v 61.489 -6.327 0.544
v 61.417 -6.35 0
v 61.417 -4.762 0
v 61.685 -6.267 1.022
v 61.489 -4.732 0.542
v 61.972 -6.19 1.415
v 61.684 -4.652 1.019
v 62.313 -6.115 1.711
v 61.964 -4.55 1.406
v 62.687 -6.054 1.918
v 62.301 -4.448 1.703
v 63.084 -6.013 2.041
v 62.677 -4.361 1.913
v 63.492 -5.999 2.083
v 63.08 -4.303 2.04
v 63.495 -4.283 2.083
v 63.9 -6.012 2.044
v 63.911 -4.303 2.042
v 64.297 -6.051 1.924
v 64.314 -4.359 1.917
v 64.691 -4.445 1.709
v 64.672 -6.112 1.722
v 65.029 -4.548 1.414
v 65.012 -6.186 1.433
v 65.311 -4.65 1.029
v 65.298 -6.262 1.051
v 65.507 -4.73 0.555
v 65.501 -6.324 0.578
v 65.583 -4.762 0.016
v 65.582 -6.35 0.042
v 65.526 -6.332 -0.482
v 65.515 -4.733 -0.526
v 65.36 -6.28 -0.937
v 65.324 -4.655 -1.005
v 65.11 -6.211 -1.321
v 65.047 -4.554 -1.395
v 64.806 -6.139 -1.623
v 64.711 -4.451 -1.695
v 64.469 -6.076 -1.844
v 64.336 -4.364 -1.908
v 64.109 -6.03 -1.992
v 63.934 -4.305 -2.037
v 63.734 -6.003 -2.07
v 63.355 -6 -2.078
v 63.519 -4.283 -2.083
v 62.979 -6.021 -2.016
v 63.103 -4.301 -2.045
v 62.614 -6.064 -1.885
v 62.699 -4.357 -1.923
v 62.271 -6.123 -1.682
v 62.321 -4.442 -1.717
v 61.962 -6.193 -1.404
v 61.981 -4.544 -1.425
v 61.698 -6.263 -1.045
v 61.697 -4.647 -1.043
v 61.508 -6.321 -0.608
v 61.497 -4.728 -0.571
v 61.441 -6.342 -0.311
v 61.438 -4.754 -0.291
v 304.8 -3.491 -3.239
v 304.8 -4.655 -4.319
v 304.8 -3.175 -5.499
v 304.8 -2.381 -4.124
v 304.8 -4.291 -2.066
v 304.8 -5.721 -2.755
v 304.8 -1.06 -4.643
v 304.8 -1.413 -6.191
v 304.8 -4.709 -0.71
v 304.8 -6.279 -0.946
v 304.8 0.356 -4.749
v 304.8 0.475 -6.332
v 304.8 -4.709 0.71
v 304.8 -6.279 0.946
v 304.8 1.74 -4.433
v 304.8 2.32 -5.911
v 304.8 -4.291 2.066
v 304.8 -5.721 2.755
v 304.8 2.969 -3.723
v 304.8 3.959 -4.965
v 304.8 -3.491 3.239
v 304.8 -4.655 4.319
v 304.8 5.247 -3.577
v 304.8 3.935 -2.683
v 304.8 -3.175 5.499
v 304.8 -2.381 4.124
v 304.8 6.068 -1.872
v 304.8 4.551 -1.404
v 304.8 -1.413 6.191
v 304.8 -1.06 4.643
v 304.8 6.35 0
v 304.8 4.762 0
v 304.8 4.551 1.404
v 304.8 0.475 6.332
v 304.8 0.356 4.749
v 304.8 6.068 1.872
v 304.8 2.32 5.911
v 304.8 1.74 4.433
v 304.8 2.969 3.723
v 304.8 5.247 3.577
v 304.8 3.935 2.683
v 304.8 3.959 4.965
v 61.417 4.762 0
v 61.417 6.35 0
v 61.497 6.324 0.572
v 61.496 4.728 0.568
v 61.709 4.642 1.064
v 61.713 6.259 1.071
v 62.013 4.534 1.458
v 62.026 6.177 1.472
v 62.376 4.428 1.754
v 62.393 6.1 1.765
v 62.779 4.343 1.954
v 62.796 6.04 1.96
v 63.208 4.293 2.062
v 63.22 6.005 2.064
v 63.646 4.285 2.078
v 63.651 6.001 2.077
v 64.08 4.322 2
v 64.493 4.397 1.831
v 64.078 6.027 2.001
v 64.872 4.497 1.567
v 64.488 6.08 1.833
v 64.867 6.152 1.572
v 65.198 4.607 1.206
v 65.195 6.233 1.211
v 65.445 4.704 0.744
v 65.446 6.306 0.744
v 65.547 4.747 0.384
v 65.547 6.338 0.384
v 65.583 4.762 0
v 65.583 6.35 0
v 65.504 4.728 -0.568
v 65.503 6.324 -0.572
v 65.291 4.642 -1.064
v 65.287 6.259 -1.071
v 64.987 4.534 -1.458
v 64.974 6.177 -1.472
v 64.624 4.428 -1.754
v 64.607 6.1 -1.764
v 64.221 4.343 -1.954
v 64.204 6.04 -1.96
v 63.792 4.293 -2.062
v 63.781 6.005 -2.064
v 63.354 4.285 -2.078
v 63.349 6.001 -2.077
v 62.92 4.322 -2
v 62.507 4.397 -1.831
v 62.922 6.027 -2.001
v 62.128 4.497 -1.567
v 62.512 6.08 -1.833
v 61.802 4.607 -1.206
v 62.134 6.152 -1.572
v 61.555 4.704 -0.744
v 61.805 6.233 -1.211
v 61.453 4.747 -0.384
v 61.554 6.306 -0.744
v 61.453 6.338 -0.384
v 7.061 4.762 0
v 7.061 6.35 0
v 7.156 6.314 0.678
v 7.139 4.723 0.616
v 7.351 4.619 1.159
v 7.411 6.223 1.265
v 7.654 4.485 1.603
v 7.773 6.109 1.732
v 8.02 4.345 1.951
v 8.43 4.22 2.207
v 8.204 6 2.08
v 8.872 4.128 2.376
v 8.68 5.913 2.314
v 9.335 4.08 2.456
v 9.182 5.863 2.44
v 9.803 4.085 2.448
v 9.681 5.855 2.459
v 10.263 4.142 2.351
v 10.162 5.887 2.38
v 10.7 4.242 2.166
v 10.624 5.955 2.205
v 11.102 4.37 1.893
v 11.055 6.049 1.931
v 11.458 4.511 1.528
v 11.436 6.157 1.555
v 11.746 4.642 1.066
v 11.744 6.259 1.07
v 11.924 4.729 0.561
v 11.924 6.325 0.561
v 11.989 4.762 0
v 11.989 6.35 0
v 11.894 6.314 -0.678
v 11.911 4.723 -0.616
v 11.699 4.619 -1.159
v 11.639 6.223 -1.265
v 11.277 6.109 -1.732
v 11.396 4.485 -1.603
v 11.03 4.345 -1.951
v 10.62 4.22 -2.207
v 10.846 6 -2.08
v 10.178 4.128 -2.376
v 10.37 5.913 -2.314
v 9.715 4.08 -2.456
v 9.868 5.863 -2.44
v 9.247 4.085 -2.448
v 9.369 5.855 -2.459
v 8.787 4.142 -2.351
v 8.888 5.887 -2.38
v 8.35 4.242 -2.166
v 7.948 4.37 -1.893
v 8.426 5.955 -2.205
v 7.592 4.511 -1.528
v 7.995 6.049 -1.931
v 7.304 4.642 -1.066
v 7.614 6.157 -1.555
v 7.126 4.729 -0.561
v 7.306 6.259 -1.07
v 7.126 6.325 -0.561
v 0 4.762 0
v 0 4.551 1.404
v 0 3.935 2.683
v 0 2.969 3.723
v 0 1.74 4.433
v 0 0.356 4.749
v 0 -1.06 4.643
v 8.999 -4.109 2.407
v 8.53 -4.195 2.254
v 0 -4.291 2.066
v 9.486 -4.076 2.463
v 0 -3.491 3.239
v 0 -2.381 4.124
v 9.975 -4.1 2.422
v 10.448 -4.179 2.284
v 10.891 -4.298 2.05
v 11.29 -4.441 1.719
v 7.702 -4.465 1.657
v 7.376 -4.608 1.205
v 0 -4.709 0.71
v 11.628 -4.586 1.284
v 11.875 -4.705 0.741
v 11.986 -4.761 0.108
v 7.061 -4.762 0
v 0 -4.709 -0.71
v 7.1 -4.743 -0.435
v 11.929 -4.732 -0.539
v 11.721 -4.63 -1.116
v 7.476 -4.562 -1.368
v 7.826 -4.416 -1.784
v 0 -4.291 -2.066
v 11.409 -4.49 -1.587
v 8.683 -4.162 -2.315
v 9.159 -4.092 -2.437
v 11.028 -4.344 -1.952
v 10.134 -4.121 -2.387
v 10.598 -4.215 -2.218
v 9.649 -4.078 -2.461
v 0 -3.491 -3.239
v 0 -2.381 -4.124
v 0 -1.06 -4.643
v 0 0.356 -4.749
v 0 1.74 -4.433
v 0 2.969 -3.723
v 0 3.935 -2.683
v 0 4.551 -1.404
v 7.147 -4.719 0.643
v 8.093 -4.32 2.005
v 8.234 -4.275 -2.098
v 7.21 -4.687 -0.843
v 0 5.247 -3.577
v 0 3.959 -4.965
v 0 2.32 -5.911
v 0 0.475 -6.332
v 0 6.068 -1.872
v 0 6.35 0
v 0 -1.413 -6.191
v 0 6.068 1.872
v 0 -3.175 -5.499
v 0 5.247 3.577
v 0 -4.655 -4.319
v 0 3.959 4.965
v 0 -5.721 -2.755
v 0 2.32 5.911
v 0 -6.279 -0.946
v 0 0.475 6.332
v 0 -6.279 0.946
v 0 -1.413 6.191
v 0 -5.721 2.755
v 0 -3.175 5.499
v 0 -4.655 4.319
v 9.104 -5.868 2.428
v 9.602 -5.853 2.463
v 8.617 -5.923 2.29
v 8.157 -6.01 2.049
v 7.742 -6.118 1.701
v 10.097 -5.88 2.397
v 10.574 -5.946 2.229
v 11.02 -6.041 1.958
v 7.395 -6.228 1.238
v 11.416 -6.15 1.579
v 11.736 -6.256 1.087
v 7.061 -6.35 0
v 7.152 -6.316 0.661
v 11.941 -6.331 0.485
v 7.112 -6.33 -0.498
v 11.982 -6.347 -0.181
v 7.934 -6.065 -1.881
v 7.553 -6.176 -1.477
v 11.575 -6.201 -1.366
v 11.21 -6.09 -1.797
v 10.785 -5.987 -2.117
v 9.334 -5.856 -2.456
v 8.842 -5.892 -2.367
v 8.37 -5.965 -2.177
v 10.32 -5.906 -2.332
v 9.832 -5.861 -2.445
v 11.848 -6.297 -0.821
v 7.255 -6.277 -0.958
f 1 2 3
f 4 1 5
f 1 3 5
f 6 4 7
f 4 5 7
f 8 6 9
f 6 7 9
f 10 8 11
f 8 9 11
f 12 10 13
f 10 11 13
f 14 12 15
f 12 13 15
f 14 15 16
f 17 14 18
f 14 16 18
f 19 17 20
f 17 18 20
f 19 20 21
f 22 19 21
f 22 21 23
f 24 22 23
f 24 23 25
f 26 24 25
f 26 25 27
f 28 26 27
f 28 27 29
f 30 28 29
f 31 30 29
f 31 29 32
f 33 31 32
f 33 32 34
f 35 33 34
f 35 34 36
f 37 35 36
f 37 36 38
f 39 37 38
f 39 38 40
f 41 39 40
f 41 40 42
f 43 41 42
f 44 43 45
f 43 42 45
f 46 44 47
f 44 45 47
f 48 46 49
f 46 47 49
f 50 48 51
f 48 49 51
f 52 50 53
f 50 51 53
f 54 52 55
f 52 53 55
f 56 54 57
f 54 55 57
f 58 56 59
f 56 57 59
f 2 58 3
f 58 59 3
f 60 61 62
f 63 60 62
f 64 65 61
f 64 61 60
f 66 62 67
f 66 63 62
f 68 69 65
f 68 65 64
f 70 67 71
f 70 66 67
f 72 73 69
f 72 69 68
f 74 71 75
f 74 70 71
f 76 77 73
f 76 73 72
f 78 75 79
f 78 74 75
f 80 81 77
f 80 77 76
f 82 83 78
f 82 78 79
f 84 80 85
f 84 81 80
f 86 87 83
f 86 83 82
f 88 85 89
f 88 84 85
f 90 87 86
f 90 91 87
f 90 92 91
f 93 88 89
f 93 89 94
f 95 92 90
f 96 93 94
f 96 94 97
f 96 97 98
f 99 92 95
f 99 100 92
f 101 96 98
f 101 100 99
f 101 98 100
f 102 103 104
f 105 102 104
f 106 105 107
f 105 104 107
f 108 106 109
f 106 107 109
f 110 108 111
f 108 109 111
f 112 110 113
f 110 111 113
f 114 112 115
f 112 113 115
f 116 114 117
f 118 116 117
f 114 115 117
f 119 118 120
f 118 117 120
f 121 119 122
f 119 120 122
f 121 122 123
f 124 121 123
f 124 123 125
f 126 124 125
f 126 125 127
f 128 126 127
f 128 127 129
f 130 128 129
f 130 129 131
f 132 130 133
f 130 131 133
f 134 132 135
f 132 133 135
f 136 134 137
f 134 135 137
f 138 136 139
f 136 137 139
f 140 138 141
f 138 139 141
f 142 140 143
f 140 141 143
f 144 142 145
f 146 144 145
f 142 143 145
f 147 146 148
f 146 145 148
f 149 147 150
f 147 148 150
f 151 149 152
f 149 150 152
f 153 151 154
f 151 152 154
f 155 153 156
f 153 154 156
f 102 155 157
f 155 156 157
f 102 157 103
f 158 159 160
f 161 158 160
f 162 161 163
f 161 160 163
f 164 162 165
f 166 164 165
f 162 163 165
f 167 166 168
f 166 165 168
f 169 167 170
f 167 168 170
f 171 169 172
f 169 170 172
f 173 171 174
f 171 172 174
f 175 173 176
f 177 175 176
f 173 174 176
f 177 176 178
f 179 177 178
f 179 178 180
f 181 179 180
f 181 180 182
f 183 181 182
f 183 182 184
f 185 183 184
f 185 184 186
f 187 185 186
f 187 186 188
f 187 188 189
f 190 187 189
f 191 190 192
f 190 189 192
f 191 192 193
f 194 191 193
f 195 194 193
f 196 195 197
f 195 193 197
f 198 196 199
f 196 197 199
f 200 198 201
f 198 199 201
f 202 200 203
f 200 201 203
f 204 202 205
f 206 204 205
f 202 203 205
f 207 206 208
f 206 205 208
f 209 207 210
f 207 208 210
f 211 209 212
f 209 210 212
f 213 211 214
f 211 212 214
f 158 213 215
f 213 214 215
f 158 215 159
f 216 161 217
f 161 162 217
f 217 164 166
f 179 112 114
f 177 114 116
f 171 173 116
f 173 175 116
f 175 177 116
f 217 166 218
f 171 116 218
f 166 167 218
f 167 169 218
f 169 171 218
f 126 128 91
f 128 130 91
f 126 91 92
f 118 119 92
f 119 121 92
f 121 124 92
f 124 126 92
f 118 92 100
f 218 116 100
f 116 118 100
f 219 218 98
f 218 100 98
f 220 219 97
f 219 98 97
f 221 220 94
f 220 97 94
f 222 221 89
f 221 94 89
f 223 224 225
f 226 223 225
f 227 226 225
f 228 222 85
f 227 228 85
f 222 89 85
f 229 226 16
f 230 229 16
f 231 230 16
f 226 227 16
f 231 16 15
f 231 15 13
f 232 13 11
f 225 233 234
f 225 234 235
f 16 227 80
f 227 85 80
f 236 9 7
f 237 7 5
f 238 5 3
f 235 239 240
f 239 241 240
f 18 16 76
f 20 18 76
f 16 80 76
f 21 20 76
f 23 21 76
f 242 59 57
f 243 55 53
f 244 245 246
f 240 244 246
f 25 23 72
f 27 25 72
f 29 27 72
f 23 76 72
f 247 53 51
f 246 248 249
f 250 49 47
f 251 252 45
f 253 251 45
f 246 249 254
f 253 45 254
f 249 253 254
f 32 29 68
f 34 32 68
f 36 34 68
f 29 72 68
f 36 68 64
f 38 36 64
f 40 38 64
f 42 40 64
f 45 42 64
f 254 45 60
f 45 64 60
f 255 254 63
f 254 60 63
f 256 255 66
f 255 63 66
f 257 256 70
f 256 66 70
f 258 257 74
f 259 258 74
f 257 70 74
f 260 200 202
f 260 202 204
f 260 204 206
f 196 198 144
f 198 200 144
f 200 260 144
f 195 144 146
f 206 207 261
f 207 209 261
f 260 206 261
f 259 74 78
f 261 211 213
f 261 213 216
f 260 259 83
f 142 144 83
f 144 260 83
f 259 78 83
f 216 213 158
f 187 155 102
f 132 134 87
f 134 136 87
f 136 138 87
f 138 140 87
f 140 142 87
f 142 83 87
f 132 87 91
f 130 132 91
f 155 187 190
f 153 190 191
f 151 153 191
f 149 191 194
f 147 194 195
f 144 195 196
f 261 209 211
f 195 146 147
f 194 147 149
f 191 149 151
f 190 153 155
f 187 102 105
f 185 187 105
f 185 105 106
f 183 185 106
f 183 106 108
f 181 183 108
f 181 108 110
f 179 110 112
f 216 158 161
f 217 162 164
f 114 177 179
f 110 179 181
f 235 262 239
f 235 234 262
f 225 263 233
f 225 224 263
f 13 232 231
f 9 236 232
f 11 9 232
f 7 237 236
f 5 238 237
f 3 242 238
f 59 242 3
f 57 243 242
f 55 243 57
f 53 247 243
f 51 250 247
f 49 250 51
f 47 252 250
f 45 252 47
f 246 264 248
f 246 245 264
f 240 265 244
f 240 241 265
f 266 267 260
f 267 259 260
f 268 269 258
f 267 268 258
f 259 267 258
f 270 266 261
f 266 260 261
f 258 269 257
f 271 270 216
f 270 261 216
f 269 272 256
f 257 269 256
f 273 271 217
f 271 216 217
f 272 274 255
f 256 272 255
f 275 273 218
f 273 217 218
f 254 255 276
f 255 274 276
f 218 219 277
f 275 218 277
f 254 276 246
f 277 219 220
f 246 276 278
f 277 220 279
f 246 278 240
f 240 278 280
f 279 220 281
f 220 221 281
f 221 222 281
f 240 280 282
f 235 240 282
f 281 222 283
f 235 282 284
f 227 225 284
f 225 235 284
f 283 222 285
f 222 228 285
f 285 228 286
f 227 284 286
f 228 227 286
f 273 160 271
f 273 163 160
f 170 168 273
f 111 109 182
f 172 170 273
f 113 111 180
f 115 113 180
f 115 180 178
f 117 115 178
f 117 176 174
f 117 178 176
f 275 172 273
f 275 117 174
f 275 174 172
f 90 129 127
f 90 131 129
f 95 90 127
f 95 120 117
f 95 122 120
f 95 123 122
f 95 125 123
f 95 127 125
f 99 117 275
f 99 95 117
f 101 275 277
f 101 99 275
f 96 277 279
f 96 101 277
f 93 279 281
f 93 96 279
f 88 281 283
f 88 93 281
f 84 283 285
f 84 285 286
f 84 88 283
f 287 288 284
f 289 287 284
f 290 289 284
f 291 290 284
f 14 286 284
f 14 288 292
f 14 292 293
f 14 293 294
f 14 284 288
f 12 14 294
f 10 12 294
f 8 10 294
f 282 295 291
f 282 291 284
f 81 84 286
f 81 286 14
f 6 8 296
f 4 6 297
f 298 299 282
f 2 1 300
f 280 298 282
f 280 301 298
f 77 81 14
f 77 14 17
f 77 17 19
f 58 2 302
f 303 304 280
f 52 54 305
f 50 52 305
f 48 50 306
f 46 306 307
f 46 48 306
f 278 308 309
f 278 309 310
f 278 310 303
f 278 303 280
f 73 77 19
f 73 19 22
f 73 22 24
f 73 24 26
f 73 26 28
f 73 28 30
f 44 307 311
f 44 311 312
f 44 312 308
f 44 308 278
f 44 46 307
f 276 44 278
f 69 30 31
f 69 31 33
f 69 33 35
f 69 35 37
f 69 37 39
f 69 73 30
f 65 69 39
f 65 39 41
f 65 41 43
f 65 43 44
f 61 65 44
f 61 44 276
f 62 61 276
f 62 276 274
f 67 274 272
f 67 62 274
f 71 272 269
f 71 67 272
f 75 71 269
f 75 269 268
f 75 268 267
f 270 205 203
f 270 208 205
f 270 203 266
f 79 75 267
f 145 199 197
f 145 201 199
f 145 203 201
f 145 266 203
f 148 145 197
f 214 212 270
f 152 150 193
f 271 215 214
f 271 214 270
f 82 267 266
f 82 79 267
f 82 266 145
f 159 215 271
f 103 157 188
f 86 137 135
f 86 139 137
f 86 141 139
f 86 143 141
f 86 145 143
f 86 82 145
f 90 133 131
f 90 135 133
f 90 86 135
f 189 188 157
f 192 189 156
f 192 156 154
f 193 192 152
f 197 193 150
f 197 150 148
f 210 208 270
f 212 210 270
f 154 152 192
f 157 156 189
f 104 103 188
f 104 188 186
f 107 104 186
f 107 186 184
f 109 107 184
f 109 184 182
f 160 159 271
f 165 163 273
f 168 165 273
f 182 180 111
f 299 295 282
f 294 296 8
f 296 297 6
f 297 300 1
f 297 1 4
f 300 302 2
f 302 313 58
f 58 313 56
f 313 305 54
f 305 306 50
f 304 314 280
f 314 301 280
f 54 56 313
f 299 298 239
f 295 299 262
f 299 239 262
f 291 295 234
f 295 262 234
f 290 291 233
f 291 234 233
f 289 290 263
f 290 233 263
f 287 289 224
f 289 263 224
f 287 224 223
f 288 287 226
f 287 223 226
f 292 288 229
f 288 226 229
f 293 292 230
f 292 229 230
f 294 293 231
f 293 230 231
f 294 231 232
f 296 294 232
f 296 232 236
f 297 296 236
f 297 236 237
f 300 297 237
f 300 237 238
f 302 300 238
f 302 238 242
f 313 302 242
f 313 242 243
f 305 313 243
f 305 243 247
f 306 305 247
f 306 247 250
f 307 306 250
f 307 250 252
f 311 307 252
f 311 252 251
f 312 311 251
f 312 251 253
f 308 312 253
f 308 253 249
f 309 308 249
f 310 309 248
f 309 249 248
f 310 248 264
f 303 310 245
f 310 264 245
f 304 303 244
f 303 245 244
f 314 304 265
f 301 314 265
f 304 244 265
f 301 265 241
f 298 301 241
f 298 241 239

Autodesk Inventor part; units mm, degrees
ref_plane "YZ Plane" through (0, 0, 0) normal (1, 0, 0) x (0, 1, 0)
sketch "Sketch1" plane through (0, 0, 0) normal (0, 0, 1) x (1, 0, 0)
  line L0 (0, 0) -> (304.8, 0)
  arc A0 (304.8, 0) -> (406.4, 101.6) centre (304.8, 101.6) ccw
  line L1 (406.4, 101.6) -> (406.4, 152.4)
  line L2 (304.8, 0) -> (304.8, 101.6) construction
  line L3 (304.8, 101.6) -> (406.4, 101.6) construction
  arc A1 (406.4, 152.4) -> (304.8, 254) centre (304.8, 152.4) ccw
  line L4 (406.4, 152.4) -> (304.8, 152.4) construction
  line L5 (304.8, 152.4) -> (304.8, 254) construction
  line L6 (304.8, 254) -> (203.2, 254)
  circle A2 centre (668.9835, 281.347) radius 317.5 construction
  dimension "d0" = 304.8
  dimension "d1" = 101.6
  dimension "d2" = 50.8
  dimension "d3" = 101.6
  dimension "d4" = 101.6
  dimension "d7" = 635
sketch "Sketch2" plane through (0, 0, 0) normal (1, 0, 0) x (0, 1, 0)
  circle A0 centre (0, 0) radius 6.35
  circle A1 centre (0, 0) radius 4.7625
  dimension "d5" = 12.7
  dimension "d8" = 9.525
sweep "Sweep1" add profiles "Sketch2" path "Sketch1"
ref_plane "Work Plane1" through (0, 6.35, 0) normal (0, 1, 0) x (-1, 0, 0)
sketch "Sketch3" plane through (0, 6.35, 0) normal (0, 1, 0) x (-1, 0, 0)
  circle A0 centre (-63.5, 0) radius 2.0828
  line L0 (0, 6.35) -> (-304.8, 6.35) projected
  line L1 (0, -6.35) -> (-304.8, -6.35) projected
  line L2 (0, -6.35) -> (0, 6.35) projected
  circle A1 centre (-9.525, 0) radius 2.4638
  point P0 (0, 0)
  dimension "d9" = 4.1656
  dimension "d10" = 63.5
  dimension "d11" = 6.35
  dimension "d14" = 4.9276
  dimension "d15" = 9.525
  dimension "d16" = 6.35
extrude "Extrusion1" cut sketch "Sketch3" against normal blind 25.4
ref_plane "Work Plane2" through (0, 0, 6.35) normal (0, 0, 1) x (1, 0, 0)
sketch "Sketch4" plane through (0, 0, 6.35) normal (0, 0, 1) x (1, 0, 0)
  line L0 (0, 0) -> (304.8, 0)
  line L1 (304.8, 0) -> (304.8, 213.1624)
  line L2 (304.8, 213.1624) -> (152.4, 213.1624)
  line L3 (152.4, 213.1624) -> (152.4, 273.9577)
  line L4 (152.4, 273.9577) -> (436.2539, 273.9577)
  line L5 (436.2539, 273.9577) -> (436.2539, -18.5171)
  line L6 (436.2539, -18.5171) -> (304.8, -18.5171)
  line L7 (304.8, -18.5171) -> (304.8, 15.9884)
  dimension "d17" = 304.8
extrude "Extrusion2" cut sketch "Sketch4" against normal blind 25.4
properties part number "12 inch pipe" material "Aluminum"
